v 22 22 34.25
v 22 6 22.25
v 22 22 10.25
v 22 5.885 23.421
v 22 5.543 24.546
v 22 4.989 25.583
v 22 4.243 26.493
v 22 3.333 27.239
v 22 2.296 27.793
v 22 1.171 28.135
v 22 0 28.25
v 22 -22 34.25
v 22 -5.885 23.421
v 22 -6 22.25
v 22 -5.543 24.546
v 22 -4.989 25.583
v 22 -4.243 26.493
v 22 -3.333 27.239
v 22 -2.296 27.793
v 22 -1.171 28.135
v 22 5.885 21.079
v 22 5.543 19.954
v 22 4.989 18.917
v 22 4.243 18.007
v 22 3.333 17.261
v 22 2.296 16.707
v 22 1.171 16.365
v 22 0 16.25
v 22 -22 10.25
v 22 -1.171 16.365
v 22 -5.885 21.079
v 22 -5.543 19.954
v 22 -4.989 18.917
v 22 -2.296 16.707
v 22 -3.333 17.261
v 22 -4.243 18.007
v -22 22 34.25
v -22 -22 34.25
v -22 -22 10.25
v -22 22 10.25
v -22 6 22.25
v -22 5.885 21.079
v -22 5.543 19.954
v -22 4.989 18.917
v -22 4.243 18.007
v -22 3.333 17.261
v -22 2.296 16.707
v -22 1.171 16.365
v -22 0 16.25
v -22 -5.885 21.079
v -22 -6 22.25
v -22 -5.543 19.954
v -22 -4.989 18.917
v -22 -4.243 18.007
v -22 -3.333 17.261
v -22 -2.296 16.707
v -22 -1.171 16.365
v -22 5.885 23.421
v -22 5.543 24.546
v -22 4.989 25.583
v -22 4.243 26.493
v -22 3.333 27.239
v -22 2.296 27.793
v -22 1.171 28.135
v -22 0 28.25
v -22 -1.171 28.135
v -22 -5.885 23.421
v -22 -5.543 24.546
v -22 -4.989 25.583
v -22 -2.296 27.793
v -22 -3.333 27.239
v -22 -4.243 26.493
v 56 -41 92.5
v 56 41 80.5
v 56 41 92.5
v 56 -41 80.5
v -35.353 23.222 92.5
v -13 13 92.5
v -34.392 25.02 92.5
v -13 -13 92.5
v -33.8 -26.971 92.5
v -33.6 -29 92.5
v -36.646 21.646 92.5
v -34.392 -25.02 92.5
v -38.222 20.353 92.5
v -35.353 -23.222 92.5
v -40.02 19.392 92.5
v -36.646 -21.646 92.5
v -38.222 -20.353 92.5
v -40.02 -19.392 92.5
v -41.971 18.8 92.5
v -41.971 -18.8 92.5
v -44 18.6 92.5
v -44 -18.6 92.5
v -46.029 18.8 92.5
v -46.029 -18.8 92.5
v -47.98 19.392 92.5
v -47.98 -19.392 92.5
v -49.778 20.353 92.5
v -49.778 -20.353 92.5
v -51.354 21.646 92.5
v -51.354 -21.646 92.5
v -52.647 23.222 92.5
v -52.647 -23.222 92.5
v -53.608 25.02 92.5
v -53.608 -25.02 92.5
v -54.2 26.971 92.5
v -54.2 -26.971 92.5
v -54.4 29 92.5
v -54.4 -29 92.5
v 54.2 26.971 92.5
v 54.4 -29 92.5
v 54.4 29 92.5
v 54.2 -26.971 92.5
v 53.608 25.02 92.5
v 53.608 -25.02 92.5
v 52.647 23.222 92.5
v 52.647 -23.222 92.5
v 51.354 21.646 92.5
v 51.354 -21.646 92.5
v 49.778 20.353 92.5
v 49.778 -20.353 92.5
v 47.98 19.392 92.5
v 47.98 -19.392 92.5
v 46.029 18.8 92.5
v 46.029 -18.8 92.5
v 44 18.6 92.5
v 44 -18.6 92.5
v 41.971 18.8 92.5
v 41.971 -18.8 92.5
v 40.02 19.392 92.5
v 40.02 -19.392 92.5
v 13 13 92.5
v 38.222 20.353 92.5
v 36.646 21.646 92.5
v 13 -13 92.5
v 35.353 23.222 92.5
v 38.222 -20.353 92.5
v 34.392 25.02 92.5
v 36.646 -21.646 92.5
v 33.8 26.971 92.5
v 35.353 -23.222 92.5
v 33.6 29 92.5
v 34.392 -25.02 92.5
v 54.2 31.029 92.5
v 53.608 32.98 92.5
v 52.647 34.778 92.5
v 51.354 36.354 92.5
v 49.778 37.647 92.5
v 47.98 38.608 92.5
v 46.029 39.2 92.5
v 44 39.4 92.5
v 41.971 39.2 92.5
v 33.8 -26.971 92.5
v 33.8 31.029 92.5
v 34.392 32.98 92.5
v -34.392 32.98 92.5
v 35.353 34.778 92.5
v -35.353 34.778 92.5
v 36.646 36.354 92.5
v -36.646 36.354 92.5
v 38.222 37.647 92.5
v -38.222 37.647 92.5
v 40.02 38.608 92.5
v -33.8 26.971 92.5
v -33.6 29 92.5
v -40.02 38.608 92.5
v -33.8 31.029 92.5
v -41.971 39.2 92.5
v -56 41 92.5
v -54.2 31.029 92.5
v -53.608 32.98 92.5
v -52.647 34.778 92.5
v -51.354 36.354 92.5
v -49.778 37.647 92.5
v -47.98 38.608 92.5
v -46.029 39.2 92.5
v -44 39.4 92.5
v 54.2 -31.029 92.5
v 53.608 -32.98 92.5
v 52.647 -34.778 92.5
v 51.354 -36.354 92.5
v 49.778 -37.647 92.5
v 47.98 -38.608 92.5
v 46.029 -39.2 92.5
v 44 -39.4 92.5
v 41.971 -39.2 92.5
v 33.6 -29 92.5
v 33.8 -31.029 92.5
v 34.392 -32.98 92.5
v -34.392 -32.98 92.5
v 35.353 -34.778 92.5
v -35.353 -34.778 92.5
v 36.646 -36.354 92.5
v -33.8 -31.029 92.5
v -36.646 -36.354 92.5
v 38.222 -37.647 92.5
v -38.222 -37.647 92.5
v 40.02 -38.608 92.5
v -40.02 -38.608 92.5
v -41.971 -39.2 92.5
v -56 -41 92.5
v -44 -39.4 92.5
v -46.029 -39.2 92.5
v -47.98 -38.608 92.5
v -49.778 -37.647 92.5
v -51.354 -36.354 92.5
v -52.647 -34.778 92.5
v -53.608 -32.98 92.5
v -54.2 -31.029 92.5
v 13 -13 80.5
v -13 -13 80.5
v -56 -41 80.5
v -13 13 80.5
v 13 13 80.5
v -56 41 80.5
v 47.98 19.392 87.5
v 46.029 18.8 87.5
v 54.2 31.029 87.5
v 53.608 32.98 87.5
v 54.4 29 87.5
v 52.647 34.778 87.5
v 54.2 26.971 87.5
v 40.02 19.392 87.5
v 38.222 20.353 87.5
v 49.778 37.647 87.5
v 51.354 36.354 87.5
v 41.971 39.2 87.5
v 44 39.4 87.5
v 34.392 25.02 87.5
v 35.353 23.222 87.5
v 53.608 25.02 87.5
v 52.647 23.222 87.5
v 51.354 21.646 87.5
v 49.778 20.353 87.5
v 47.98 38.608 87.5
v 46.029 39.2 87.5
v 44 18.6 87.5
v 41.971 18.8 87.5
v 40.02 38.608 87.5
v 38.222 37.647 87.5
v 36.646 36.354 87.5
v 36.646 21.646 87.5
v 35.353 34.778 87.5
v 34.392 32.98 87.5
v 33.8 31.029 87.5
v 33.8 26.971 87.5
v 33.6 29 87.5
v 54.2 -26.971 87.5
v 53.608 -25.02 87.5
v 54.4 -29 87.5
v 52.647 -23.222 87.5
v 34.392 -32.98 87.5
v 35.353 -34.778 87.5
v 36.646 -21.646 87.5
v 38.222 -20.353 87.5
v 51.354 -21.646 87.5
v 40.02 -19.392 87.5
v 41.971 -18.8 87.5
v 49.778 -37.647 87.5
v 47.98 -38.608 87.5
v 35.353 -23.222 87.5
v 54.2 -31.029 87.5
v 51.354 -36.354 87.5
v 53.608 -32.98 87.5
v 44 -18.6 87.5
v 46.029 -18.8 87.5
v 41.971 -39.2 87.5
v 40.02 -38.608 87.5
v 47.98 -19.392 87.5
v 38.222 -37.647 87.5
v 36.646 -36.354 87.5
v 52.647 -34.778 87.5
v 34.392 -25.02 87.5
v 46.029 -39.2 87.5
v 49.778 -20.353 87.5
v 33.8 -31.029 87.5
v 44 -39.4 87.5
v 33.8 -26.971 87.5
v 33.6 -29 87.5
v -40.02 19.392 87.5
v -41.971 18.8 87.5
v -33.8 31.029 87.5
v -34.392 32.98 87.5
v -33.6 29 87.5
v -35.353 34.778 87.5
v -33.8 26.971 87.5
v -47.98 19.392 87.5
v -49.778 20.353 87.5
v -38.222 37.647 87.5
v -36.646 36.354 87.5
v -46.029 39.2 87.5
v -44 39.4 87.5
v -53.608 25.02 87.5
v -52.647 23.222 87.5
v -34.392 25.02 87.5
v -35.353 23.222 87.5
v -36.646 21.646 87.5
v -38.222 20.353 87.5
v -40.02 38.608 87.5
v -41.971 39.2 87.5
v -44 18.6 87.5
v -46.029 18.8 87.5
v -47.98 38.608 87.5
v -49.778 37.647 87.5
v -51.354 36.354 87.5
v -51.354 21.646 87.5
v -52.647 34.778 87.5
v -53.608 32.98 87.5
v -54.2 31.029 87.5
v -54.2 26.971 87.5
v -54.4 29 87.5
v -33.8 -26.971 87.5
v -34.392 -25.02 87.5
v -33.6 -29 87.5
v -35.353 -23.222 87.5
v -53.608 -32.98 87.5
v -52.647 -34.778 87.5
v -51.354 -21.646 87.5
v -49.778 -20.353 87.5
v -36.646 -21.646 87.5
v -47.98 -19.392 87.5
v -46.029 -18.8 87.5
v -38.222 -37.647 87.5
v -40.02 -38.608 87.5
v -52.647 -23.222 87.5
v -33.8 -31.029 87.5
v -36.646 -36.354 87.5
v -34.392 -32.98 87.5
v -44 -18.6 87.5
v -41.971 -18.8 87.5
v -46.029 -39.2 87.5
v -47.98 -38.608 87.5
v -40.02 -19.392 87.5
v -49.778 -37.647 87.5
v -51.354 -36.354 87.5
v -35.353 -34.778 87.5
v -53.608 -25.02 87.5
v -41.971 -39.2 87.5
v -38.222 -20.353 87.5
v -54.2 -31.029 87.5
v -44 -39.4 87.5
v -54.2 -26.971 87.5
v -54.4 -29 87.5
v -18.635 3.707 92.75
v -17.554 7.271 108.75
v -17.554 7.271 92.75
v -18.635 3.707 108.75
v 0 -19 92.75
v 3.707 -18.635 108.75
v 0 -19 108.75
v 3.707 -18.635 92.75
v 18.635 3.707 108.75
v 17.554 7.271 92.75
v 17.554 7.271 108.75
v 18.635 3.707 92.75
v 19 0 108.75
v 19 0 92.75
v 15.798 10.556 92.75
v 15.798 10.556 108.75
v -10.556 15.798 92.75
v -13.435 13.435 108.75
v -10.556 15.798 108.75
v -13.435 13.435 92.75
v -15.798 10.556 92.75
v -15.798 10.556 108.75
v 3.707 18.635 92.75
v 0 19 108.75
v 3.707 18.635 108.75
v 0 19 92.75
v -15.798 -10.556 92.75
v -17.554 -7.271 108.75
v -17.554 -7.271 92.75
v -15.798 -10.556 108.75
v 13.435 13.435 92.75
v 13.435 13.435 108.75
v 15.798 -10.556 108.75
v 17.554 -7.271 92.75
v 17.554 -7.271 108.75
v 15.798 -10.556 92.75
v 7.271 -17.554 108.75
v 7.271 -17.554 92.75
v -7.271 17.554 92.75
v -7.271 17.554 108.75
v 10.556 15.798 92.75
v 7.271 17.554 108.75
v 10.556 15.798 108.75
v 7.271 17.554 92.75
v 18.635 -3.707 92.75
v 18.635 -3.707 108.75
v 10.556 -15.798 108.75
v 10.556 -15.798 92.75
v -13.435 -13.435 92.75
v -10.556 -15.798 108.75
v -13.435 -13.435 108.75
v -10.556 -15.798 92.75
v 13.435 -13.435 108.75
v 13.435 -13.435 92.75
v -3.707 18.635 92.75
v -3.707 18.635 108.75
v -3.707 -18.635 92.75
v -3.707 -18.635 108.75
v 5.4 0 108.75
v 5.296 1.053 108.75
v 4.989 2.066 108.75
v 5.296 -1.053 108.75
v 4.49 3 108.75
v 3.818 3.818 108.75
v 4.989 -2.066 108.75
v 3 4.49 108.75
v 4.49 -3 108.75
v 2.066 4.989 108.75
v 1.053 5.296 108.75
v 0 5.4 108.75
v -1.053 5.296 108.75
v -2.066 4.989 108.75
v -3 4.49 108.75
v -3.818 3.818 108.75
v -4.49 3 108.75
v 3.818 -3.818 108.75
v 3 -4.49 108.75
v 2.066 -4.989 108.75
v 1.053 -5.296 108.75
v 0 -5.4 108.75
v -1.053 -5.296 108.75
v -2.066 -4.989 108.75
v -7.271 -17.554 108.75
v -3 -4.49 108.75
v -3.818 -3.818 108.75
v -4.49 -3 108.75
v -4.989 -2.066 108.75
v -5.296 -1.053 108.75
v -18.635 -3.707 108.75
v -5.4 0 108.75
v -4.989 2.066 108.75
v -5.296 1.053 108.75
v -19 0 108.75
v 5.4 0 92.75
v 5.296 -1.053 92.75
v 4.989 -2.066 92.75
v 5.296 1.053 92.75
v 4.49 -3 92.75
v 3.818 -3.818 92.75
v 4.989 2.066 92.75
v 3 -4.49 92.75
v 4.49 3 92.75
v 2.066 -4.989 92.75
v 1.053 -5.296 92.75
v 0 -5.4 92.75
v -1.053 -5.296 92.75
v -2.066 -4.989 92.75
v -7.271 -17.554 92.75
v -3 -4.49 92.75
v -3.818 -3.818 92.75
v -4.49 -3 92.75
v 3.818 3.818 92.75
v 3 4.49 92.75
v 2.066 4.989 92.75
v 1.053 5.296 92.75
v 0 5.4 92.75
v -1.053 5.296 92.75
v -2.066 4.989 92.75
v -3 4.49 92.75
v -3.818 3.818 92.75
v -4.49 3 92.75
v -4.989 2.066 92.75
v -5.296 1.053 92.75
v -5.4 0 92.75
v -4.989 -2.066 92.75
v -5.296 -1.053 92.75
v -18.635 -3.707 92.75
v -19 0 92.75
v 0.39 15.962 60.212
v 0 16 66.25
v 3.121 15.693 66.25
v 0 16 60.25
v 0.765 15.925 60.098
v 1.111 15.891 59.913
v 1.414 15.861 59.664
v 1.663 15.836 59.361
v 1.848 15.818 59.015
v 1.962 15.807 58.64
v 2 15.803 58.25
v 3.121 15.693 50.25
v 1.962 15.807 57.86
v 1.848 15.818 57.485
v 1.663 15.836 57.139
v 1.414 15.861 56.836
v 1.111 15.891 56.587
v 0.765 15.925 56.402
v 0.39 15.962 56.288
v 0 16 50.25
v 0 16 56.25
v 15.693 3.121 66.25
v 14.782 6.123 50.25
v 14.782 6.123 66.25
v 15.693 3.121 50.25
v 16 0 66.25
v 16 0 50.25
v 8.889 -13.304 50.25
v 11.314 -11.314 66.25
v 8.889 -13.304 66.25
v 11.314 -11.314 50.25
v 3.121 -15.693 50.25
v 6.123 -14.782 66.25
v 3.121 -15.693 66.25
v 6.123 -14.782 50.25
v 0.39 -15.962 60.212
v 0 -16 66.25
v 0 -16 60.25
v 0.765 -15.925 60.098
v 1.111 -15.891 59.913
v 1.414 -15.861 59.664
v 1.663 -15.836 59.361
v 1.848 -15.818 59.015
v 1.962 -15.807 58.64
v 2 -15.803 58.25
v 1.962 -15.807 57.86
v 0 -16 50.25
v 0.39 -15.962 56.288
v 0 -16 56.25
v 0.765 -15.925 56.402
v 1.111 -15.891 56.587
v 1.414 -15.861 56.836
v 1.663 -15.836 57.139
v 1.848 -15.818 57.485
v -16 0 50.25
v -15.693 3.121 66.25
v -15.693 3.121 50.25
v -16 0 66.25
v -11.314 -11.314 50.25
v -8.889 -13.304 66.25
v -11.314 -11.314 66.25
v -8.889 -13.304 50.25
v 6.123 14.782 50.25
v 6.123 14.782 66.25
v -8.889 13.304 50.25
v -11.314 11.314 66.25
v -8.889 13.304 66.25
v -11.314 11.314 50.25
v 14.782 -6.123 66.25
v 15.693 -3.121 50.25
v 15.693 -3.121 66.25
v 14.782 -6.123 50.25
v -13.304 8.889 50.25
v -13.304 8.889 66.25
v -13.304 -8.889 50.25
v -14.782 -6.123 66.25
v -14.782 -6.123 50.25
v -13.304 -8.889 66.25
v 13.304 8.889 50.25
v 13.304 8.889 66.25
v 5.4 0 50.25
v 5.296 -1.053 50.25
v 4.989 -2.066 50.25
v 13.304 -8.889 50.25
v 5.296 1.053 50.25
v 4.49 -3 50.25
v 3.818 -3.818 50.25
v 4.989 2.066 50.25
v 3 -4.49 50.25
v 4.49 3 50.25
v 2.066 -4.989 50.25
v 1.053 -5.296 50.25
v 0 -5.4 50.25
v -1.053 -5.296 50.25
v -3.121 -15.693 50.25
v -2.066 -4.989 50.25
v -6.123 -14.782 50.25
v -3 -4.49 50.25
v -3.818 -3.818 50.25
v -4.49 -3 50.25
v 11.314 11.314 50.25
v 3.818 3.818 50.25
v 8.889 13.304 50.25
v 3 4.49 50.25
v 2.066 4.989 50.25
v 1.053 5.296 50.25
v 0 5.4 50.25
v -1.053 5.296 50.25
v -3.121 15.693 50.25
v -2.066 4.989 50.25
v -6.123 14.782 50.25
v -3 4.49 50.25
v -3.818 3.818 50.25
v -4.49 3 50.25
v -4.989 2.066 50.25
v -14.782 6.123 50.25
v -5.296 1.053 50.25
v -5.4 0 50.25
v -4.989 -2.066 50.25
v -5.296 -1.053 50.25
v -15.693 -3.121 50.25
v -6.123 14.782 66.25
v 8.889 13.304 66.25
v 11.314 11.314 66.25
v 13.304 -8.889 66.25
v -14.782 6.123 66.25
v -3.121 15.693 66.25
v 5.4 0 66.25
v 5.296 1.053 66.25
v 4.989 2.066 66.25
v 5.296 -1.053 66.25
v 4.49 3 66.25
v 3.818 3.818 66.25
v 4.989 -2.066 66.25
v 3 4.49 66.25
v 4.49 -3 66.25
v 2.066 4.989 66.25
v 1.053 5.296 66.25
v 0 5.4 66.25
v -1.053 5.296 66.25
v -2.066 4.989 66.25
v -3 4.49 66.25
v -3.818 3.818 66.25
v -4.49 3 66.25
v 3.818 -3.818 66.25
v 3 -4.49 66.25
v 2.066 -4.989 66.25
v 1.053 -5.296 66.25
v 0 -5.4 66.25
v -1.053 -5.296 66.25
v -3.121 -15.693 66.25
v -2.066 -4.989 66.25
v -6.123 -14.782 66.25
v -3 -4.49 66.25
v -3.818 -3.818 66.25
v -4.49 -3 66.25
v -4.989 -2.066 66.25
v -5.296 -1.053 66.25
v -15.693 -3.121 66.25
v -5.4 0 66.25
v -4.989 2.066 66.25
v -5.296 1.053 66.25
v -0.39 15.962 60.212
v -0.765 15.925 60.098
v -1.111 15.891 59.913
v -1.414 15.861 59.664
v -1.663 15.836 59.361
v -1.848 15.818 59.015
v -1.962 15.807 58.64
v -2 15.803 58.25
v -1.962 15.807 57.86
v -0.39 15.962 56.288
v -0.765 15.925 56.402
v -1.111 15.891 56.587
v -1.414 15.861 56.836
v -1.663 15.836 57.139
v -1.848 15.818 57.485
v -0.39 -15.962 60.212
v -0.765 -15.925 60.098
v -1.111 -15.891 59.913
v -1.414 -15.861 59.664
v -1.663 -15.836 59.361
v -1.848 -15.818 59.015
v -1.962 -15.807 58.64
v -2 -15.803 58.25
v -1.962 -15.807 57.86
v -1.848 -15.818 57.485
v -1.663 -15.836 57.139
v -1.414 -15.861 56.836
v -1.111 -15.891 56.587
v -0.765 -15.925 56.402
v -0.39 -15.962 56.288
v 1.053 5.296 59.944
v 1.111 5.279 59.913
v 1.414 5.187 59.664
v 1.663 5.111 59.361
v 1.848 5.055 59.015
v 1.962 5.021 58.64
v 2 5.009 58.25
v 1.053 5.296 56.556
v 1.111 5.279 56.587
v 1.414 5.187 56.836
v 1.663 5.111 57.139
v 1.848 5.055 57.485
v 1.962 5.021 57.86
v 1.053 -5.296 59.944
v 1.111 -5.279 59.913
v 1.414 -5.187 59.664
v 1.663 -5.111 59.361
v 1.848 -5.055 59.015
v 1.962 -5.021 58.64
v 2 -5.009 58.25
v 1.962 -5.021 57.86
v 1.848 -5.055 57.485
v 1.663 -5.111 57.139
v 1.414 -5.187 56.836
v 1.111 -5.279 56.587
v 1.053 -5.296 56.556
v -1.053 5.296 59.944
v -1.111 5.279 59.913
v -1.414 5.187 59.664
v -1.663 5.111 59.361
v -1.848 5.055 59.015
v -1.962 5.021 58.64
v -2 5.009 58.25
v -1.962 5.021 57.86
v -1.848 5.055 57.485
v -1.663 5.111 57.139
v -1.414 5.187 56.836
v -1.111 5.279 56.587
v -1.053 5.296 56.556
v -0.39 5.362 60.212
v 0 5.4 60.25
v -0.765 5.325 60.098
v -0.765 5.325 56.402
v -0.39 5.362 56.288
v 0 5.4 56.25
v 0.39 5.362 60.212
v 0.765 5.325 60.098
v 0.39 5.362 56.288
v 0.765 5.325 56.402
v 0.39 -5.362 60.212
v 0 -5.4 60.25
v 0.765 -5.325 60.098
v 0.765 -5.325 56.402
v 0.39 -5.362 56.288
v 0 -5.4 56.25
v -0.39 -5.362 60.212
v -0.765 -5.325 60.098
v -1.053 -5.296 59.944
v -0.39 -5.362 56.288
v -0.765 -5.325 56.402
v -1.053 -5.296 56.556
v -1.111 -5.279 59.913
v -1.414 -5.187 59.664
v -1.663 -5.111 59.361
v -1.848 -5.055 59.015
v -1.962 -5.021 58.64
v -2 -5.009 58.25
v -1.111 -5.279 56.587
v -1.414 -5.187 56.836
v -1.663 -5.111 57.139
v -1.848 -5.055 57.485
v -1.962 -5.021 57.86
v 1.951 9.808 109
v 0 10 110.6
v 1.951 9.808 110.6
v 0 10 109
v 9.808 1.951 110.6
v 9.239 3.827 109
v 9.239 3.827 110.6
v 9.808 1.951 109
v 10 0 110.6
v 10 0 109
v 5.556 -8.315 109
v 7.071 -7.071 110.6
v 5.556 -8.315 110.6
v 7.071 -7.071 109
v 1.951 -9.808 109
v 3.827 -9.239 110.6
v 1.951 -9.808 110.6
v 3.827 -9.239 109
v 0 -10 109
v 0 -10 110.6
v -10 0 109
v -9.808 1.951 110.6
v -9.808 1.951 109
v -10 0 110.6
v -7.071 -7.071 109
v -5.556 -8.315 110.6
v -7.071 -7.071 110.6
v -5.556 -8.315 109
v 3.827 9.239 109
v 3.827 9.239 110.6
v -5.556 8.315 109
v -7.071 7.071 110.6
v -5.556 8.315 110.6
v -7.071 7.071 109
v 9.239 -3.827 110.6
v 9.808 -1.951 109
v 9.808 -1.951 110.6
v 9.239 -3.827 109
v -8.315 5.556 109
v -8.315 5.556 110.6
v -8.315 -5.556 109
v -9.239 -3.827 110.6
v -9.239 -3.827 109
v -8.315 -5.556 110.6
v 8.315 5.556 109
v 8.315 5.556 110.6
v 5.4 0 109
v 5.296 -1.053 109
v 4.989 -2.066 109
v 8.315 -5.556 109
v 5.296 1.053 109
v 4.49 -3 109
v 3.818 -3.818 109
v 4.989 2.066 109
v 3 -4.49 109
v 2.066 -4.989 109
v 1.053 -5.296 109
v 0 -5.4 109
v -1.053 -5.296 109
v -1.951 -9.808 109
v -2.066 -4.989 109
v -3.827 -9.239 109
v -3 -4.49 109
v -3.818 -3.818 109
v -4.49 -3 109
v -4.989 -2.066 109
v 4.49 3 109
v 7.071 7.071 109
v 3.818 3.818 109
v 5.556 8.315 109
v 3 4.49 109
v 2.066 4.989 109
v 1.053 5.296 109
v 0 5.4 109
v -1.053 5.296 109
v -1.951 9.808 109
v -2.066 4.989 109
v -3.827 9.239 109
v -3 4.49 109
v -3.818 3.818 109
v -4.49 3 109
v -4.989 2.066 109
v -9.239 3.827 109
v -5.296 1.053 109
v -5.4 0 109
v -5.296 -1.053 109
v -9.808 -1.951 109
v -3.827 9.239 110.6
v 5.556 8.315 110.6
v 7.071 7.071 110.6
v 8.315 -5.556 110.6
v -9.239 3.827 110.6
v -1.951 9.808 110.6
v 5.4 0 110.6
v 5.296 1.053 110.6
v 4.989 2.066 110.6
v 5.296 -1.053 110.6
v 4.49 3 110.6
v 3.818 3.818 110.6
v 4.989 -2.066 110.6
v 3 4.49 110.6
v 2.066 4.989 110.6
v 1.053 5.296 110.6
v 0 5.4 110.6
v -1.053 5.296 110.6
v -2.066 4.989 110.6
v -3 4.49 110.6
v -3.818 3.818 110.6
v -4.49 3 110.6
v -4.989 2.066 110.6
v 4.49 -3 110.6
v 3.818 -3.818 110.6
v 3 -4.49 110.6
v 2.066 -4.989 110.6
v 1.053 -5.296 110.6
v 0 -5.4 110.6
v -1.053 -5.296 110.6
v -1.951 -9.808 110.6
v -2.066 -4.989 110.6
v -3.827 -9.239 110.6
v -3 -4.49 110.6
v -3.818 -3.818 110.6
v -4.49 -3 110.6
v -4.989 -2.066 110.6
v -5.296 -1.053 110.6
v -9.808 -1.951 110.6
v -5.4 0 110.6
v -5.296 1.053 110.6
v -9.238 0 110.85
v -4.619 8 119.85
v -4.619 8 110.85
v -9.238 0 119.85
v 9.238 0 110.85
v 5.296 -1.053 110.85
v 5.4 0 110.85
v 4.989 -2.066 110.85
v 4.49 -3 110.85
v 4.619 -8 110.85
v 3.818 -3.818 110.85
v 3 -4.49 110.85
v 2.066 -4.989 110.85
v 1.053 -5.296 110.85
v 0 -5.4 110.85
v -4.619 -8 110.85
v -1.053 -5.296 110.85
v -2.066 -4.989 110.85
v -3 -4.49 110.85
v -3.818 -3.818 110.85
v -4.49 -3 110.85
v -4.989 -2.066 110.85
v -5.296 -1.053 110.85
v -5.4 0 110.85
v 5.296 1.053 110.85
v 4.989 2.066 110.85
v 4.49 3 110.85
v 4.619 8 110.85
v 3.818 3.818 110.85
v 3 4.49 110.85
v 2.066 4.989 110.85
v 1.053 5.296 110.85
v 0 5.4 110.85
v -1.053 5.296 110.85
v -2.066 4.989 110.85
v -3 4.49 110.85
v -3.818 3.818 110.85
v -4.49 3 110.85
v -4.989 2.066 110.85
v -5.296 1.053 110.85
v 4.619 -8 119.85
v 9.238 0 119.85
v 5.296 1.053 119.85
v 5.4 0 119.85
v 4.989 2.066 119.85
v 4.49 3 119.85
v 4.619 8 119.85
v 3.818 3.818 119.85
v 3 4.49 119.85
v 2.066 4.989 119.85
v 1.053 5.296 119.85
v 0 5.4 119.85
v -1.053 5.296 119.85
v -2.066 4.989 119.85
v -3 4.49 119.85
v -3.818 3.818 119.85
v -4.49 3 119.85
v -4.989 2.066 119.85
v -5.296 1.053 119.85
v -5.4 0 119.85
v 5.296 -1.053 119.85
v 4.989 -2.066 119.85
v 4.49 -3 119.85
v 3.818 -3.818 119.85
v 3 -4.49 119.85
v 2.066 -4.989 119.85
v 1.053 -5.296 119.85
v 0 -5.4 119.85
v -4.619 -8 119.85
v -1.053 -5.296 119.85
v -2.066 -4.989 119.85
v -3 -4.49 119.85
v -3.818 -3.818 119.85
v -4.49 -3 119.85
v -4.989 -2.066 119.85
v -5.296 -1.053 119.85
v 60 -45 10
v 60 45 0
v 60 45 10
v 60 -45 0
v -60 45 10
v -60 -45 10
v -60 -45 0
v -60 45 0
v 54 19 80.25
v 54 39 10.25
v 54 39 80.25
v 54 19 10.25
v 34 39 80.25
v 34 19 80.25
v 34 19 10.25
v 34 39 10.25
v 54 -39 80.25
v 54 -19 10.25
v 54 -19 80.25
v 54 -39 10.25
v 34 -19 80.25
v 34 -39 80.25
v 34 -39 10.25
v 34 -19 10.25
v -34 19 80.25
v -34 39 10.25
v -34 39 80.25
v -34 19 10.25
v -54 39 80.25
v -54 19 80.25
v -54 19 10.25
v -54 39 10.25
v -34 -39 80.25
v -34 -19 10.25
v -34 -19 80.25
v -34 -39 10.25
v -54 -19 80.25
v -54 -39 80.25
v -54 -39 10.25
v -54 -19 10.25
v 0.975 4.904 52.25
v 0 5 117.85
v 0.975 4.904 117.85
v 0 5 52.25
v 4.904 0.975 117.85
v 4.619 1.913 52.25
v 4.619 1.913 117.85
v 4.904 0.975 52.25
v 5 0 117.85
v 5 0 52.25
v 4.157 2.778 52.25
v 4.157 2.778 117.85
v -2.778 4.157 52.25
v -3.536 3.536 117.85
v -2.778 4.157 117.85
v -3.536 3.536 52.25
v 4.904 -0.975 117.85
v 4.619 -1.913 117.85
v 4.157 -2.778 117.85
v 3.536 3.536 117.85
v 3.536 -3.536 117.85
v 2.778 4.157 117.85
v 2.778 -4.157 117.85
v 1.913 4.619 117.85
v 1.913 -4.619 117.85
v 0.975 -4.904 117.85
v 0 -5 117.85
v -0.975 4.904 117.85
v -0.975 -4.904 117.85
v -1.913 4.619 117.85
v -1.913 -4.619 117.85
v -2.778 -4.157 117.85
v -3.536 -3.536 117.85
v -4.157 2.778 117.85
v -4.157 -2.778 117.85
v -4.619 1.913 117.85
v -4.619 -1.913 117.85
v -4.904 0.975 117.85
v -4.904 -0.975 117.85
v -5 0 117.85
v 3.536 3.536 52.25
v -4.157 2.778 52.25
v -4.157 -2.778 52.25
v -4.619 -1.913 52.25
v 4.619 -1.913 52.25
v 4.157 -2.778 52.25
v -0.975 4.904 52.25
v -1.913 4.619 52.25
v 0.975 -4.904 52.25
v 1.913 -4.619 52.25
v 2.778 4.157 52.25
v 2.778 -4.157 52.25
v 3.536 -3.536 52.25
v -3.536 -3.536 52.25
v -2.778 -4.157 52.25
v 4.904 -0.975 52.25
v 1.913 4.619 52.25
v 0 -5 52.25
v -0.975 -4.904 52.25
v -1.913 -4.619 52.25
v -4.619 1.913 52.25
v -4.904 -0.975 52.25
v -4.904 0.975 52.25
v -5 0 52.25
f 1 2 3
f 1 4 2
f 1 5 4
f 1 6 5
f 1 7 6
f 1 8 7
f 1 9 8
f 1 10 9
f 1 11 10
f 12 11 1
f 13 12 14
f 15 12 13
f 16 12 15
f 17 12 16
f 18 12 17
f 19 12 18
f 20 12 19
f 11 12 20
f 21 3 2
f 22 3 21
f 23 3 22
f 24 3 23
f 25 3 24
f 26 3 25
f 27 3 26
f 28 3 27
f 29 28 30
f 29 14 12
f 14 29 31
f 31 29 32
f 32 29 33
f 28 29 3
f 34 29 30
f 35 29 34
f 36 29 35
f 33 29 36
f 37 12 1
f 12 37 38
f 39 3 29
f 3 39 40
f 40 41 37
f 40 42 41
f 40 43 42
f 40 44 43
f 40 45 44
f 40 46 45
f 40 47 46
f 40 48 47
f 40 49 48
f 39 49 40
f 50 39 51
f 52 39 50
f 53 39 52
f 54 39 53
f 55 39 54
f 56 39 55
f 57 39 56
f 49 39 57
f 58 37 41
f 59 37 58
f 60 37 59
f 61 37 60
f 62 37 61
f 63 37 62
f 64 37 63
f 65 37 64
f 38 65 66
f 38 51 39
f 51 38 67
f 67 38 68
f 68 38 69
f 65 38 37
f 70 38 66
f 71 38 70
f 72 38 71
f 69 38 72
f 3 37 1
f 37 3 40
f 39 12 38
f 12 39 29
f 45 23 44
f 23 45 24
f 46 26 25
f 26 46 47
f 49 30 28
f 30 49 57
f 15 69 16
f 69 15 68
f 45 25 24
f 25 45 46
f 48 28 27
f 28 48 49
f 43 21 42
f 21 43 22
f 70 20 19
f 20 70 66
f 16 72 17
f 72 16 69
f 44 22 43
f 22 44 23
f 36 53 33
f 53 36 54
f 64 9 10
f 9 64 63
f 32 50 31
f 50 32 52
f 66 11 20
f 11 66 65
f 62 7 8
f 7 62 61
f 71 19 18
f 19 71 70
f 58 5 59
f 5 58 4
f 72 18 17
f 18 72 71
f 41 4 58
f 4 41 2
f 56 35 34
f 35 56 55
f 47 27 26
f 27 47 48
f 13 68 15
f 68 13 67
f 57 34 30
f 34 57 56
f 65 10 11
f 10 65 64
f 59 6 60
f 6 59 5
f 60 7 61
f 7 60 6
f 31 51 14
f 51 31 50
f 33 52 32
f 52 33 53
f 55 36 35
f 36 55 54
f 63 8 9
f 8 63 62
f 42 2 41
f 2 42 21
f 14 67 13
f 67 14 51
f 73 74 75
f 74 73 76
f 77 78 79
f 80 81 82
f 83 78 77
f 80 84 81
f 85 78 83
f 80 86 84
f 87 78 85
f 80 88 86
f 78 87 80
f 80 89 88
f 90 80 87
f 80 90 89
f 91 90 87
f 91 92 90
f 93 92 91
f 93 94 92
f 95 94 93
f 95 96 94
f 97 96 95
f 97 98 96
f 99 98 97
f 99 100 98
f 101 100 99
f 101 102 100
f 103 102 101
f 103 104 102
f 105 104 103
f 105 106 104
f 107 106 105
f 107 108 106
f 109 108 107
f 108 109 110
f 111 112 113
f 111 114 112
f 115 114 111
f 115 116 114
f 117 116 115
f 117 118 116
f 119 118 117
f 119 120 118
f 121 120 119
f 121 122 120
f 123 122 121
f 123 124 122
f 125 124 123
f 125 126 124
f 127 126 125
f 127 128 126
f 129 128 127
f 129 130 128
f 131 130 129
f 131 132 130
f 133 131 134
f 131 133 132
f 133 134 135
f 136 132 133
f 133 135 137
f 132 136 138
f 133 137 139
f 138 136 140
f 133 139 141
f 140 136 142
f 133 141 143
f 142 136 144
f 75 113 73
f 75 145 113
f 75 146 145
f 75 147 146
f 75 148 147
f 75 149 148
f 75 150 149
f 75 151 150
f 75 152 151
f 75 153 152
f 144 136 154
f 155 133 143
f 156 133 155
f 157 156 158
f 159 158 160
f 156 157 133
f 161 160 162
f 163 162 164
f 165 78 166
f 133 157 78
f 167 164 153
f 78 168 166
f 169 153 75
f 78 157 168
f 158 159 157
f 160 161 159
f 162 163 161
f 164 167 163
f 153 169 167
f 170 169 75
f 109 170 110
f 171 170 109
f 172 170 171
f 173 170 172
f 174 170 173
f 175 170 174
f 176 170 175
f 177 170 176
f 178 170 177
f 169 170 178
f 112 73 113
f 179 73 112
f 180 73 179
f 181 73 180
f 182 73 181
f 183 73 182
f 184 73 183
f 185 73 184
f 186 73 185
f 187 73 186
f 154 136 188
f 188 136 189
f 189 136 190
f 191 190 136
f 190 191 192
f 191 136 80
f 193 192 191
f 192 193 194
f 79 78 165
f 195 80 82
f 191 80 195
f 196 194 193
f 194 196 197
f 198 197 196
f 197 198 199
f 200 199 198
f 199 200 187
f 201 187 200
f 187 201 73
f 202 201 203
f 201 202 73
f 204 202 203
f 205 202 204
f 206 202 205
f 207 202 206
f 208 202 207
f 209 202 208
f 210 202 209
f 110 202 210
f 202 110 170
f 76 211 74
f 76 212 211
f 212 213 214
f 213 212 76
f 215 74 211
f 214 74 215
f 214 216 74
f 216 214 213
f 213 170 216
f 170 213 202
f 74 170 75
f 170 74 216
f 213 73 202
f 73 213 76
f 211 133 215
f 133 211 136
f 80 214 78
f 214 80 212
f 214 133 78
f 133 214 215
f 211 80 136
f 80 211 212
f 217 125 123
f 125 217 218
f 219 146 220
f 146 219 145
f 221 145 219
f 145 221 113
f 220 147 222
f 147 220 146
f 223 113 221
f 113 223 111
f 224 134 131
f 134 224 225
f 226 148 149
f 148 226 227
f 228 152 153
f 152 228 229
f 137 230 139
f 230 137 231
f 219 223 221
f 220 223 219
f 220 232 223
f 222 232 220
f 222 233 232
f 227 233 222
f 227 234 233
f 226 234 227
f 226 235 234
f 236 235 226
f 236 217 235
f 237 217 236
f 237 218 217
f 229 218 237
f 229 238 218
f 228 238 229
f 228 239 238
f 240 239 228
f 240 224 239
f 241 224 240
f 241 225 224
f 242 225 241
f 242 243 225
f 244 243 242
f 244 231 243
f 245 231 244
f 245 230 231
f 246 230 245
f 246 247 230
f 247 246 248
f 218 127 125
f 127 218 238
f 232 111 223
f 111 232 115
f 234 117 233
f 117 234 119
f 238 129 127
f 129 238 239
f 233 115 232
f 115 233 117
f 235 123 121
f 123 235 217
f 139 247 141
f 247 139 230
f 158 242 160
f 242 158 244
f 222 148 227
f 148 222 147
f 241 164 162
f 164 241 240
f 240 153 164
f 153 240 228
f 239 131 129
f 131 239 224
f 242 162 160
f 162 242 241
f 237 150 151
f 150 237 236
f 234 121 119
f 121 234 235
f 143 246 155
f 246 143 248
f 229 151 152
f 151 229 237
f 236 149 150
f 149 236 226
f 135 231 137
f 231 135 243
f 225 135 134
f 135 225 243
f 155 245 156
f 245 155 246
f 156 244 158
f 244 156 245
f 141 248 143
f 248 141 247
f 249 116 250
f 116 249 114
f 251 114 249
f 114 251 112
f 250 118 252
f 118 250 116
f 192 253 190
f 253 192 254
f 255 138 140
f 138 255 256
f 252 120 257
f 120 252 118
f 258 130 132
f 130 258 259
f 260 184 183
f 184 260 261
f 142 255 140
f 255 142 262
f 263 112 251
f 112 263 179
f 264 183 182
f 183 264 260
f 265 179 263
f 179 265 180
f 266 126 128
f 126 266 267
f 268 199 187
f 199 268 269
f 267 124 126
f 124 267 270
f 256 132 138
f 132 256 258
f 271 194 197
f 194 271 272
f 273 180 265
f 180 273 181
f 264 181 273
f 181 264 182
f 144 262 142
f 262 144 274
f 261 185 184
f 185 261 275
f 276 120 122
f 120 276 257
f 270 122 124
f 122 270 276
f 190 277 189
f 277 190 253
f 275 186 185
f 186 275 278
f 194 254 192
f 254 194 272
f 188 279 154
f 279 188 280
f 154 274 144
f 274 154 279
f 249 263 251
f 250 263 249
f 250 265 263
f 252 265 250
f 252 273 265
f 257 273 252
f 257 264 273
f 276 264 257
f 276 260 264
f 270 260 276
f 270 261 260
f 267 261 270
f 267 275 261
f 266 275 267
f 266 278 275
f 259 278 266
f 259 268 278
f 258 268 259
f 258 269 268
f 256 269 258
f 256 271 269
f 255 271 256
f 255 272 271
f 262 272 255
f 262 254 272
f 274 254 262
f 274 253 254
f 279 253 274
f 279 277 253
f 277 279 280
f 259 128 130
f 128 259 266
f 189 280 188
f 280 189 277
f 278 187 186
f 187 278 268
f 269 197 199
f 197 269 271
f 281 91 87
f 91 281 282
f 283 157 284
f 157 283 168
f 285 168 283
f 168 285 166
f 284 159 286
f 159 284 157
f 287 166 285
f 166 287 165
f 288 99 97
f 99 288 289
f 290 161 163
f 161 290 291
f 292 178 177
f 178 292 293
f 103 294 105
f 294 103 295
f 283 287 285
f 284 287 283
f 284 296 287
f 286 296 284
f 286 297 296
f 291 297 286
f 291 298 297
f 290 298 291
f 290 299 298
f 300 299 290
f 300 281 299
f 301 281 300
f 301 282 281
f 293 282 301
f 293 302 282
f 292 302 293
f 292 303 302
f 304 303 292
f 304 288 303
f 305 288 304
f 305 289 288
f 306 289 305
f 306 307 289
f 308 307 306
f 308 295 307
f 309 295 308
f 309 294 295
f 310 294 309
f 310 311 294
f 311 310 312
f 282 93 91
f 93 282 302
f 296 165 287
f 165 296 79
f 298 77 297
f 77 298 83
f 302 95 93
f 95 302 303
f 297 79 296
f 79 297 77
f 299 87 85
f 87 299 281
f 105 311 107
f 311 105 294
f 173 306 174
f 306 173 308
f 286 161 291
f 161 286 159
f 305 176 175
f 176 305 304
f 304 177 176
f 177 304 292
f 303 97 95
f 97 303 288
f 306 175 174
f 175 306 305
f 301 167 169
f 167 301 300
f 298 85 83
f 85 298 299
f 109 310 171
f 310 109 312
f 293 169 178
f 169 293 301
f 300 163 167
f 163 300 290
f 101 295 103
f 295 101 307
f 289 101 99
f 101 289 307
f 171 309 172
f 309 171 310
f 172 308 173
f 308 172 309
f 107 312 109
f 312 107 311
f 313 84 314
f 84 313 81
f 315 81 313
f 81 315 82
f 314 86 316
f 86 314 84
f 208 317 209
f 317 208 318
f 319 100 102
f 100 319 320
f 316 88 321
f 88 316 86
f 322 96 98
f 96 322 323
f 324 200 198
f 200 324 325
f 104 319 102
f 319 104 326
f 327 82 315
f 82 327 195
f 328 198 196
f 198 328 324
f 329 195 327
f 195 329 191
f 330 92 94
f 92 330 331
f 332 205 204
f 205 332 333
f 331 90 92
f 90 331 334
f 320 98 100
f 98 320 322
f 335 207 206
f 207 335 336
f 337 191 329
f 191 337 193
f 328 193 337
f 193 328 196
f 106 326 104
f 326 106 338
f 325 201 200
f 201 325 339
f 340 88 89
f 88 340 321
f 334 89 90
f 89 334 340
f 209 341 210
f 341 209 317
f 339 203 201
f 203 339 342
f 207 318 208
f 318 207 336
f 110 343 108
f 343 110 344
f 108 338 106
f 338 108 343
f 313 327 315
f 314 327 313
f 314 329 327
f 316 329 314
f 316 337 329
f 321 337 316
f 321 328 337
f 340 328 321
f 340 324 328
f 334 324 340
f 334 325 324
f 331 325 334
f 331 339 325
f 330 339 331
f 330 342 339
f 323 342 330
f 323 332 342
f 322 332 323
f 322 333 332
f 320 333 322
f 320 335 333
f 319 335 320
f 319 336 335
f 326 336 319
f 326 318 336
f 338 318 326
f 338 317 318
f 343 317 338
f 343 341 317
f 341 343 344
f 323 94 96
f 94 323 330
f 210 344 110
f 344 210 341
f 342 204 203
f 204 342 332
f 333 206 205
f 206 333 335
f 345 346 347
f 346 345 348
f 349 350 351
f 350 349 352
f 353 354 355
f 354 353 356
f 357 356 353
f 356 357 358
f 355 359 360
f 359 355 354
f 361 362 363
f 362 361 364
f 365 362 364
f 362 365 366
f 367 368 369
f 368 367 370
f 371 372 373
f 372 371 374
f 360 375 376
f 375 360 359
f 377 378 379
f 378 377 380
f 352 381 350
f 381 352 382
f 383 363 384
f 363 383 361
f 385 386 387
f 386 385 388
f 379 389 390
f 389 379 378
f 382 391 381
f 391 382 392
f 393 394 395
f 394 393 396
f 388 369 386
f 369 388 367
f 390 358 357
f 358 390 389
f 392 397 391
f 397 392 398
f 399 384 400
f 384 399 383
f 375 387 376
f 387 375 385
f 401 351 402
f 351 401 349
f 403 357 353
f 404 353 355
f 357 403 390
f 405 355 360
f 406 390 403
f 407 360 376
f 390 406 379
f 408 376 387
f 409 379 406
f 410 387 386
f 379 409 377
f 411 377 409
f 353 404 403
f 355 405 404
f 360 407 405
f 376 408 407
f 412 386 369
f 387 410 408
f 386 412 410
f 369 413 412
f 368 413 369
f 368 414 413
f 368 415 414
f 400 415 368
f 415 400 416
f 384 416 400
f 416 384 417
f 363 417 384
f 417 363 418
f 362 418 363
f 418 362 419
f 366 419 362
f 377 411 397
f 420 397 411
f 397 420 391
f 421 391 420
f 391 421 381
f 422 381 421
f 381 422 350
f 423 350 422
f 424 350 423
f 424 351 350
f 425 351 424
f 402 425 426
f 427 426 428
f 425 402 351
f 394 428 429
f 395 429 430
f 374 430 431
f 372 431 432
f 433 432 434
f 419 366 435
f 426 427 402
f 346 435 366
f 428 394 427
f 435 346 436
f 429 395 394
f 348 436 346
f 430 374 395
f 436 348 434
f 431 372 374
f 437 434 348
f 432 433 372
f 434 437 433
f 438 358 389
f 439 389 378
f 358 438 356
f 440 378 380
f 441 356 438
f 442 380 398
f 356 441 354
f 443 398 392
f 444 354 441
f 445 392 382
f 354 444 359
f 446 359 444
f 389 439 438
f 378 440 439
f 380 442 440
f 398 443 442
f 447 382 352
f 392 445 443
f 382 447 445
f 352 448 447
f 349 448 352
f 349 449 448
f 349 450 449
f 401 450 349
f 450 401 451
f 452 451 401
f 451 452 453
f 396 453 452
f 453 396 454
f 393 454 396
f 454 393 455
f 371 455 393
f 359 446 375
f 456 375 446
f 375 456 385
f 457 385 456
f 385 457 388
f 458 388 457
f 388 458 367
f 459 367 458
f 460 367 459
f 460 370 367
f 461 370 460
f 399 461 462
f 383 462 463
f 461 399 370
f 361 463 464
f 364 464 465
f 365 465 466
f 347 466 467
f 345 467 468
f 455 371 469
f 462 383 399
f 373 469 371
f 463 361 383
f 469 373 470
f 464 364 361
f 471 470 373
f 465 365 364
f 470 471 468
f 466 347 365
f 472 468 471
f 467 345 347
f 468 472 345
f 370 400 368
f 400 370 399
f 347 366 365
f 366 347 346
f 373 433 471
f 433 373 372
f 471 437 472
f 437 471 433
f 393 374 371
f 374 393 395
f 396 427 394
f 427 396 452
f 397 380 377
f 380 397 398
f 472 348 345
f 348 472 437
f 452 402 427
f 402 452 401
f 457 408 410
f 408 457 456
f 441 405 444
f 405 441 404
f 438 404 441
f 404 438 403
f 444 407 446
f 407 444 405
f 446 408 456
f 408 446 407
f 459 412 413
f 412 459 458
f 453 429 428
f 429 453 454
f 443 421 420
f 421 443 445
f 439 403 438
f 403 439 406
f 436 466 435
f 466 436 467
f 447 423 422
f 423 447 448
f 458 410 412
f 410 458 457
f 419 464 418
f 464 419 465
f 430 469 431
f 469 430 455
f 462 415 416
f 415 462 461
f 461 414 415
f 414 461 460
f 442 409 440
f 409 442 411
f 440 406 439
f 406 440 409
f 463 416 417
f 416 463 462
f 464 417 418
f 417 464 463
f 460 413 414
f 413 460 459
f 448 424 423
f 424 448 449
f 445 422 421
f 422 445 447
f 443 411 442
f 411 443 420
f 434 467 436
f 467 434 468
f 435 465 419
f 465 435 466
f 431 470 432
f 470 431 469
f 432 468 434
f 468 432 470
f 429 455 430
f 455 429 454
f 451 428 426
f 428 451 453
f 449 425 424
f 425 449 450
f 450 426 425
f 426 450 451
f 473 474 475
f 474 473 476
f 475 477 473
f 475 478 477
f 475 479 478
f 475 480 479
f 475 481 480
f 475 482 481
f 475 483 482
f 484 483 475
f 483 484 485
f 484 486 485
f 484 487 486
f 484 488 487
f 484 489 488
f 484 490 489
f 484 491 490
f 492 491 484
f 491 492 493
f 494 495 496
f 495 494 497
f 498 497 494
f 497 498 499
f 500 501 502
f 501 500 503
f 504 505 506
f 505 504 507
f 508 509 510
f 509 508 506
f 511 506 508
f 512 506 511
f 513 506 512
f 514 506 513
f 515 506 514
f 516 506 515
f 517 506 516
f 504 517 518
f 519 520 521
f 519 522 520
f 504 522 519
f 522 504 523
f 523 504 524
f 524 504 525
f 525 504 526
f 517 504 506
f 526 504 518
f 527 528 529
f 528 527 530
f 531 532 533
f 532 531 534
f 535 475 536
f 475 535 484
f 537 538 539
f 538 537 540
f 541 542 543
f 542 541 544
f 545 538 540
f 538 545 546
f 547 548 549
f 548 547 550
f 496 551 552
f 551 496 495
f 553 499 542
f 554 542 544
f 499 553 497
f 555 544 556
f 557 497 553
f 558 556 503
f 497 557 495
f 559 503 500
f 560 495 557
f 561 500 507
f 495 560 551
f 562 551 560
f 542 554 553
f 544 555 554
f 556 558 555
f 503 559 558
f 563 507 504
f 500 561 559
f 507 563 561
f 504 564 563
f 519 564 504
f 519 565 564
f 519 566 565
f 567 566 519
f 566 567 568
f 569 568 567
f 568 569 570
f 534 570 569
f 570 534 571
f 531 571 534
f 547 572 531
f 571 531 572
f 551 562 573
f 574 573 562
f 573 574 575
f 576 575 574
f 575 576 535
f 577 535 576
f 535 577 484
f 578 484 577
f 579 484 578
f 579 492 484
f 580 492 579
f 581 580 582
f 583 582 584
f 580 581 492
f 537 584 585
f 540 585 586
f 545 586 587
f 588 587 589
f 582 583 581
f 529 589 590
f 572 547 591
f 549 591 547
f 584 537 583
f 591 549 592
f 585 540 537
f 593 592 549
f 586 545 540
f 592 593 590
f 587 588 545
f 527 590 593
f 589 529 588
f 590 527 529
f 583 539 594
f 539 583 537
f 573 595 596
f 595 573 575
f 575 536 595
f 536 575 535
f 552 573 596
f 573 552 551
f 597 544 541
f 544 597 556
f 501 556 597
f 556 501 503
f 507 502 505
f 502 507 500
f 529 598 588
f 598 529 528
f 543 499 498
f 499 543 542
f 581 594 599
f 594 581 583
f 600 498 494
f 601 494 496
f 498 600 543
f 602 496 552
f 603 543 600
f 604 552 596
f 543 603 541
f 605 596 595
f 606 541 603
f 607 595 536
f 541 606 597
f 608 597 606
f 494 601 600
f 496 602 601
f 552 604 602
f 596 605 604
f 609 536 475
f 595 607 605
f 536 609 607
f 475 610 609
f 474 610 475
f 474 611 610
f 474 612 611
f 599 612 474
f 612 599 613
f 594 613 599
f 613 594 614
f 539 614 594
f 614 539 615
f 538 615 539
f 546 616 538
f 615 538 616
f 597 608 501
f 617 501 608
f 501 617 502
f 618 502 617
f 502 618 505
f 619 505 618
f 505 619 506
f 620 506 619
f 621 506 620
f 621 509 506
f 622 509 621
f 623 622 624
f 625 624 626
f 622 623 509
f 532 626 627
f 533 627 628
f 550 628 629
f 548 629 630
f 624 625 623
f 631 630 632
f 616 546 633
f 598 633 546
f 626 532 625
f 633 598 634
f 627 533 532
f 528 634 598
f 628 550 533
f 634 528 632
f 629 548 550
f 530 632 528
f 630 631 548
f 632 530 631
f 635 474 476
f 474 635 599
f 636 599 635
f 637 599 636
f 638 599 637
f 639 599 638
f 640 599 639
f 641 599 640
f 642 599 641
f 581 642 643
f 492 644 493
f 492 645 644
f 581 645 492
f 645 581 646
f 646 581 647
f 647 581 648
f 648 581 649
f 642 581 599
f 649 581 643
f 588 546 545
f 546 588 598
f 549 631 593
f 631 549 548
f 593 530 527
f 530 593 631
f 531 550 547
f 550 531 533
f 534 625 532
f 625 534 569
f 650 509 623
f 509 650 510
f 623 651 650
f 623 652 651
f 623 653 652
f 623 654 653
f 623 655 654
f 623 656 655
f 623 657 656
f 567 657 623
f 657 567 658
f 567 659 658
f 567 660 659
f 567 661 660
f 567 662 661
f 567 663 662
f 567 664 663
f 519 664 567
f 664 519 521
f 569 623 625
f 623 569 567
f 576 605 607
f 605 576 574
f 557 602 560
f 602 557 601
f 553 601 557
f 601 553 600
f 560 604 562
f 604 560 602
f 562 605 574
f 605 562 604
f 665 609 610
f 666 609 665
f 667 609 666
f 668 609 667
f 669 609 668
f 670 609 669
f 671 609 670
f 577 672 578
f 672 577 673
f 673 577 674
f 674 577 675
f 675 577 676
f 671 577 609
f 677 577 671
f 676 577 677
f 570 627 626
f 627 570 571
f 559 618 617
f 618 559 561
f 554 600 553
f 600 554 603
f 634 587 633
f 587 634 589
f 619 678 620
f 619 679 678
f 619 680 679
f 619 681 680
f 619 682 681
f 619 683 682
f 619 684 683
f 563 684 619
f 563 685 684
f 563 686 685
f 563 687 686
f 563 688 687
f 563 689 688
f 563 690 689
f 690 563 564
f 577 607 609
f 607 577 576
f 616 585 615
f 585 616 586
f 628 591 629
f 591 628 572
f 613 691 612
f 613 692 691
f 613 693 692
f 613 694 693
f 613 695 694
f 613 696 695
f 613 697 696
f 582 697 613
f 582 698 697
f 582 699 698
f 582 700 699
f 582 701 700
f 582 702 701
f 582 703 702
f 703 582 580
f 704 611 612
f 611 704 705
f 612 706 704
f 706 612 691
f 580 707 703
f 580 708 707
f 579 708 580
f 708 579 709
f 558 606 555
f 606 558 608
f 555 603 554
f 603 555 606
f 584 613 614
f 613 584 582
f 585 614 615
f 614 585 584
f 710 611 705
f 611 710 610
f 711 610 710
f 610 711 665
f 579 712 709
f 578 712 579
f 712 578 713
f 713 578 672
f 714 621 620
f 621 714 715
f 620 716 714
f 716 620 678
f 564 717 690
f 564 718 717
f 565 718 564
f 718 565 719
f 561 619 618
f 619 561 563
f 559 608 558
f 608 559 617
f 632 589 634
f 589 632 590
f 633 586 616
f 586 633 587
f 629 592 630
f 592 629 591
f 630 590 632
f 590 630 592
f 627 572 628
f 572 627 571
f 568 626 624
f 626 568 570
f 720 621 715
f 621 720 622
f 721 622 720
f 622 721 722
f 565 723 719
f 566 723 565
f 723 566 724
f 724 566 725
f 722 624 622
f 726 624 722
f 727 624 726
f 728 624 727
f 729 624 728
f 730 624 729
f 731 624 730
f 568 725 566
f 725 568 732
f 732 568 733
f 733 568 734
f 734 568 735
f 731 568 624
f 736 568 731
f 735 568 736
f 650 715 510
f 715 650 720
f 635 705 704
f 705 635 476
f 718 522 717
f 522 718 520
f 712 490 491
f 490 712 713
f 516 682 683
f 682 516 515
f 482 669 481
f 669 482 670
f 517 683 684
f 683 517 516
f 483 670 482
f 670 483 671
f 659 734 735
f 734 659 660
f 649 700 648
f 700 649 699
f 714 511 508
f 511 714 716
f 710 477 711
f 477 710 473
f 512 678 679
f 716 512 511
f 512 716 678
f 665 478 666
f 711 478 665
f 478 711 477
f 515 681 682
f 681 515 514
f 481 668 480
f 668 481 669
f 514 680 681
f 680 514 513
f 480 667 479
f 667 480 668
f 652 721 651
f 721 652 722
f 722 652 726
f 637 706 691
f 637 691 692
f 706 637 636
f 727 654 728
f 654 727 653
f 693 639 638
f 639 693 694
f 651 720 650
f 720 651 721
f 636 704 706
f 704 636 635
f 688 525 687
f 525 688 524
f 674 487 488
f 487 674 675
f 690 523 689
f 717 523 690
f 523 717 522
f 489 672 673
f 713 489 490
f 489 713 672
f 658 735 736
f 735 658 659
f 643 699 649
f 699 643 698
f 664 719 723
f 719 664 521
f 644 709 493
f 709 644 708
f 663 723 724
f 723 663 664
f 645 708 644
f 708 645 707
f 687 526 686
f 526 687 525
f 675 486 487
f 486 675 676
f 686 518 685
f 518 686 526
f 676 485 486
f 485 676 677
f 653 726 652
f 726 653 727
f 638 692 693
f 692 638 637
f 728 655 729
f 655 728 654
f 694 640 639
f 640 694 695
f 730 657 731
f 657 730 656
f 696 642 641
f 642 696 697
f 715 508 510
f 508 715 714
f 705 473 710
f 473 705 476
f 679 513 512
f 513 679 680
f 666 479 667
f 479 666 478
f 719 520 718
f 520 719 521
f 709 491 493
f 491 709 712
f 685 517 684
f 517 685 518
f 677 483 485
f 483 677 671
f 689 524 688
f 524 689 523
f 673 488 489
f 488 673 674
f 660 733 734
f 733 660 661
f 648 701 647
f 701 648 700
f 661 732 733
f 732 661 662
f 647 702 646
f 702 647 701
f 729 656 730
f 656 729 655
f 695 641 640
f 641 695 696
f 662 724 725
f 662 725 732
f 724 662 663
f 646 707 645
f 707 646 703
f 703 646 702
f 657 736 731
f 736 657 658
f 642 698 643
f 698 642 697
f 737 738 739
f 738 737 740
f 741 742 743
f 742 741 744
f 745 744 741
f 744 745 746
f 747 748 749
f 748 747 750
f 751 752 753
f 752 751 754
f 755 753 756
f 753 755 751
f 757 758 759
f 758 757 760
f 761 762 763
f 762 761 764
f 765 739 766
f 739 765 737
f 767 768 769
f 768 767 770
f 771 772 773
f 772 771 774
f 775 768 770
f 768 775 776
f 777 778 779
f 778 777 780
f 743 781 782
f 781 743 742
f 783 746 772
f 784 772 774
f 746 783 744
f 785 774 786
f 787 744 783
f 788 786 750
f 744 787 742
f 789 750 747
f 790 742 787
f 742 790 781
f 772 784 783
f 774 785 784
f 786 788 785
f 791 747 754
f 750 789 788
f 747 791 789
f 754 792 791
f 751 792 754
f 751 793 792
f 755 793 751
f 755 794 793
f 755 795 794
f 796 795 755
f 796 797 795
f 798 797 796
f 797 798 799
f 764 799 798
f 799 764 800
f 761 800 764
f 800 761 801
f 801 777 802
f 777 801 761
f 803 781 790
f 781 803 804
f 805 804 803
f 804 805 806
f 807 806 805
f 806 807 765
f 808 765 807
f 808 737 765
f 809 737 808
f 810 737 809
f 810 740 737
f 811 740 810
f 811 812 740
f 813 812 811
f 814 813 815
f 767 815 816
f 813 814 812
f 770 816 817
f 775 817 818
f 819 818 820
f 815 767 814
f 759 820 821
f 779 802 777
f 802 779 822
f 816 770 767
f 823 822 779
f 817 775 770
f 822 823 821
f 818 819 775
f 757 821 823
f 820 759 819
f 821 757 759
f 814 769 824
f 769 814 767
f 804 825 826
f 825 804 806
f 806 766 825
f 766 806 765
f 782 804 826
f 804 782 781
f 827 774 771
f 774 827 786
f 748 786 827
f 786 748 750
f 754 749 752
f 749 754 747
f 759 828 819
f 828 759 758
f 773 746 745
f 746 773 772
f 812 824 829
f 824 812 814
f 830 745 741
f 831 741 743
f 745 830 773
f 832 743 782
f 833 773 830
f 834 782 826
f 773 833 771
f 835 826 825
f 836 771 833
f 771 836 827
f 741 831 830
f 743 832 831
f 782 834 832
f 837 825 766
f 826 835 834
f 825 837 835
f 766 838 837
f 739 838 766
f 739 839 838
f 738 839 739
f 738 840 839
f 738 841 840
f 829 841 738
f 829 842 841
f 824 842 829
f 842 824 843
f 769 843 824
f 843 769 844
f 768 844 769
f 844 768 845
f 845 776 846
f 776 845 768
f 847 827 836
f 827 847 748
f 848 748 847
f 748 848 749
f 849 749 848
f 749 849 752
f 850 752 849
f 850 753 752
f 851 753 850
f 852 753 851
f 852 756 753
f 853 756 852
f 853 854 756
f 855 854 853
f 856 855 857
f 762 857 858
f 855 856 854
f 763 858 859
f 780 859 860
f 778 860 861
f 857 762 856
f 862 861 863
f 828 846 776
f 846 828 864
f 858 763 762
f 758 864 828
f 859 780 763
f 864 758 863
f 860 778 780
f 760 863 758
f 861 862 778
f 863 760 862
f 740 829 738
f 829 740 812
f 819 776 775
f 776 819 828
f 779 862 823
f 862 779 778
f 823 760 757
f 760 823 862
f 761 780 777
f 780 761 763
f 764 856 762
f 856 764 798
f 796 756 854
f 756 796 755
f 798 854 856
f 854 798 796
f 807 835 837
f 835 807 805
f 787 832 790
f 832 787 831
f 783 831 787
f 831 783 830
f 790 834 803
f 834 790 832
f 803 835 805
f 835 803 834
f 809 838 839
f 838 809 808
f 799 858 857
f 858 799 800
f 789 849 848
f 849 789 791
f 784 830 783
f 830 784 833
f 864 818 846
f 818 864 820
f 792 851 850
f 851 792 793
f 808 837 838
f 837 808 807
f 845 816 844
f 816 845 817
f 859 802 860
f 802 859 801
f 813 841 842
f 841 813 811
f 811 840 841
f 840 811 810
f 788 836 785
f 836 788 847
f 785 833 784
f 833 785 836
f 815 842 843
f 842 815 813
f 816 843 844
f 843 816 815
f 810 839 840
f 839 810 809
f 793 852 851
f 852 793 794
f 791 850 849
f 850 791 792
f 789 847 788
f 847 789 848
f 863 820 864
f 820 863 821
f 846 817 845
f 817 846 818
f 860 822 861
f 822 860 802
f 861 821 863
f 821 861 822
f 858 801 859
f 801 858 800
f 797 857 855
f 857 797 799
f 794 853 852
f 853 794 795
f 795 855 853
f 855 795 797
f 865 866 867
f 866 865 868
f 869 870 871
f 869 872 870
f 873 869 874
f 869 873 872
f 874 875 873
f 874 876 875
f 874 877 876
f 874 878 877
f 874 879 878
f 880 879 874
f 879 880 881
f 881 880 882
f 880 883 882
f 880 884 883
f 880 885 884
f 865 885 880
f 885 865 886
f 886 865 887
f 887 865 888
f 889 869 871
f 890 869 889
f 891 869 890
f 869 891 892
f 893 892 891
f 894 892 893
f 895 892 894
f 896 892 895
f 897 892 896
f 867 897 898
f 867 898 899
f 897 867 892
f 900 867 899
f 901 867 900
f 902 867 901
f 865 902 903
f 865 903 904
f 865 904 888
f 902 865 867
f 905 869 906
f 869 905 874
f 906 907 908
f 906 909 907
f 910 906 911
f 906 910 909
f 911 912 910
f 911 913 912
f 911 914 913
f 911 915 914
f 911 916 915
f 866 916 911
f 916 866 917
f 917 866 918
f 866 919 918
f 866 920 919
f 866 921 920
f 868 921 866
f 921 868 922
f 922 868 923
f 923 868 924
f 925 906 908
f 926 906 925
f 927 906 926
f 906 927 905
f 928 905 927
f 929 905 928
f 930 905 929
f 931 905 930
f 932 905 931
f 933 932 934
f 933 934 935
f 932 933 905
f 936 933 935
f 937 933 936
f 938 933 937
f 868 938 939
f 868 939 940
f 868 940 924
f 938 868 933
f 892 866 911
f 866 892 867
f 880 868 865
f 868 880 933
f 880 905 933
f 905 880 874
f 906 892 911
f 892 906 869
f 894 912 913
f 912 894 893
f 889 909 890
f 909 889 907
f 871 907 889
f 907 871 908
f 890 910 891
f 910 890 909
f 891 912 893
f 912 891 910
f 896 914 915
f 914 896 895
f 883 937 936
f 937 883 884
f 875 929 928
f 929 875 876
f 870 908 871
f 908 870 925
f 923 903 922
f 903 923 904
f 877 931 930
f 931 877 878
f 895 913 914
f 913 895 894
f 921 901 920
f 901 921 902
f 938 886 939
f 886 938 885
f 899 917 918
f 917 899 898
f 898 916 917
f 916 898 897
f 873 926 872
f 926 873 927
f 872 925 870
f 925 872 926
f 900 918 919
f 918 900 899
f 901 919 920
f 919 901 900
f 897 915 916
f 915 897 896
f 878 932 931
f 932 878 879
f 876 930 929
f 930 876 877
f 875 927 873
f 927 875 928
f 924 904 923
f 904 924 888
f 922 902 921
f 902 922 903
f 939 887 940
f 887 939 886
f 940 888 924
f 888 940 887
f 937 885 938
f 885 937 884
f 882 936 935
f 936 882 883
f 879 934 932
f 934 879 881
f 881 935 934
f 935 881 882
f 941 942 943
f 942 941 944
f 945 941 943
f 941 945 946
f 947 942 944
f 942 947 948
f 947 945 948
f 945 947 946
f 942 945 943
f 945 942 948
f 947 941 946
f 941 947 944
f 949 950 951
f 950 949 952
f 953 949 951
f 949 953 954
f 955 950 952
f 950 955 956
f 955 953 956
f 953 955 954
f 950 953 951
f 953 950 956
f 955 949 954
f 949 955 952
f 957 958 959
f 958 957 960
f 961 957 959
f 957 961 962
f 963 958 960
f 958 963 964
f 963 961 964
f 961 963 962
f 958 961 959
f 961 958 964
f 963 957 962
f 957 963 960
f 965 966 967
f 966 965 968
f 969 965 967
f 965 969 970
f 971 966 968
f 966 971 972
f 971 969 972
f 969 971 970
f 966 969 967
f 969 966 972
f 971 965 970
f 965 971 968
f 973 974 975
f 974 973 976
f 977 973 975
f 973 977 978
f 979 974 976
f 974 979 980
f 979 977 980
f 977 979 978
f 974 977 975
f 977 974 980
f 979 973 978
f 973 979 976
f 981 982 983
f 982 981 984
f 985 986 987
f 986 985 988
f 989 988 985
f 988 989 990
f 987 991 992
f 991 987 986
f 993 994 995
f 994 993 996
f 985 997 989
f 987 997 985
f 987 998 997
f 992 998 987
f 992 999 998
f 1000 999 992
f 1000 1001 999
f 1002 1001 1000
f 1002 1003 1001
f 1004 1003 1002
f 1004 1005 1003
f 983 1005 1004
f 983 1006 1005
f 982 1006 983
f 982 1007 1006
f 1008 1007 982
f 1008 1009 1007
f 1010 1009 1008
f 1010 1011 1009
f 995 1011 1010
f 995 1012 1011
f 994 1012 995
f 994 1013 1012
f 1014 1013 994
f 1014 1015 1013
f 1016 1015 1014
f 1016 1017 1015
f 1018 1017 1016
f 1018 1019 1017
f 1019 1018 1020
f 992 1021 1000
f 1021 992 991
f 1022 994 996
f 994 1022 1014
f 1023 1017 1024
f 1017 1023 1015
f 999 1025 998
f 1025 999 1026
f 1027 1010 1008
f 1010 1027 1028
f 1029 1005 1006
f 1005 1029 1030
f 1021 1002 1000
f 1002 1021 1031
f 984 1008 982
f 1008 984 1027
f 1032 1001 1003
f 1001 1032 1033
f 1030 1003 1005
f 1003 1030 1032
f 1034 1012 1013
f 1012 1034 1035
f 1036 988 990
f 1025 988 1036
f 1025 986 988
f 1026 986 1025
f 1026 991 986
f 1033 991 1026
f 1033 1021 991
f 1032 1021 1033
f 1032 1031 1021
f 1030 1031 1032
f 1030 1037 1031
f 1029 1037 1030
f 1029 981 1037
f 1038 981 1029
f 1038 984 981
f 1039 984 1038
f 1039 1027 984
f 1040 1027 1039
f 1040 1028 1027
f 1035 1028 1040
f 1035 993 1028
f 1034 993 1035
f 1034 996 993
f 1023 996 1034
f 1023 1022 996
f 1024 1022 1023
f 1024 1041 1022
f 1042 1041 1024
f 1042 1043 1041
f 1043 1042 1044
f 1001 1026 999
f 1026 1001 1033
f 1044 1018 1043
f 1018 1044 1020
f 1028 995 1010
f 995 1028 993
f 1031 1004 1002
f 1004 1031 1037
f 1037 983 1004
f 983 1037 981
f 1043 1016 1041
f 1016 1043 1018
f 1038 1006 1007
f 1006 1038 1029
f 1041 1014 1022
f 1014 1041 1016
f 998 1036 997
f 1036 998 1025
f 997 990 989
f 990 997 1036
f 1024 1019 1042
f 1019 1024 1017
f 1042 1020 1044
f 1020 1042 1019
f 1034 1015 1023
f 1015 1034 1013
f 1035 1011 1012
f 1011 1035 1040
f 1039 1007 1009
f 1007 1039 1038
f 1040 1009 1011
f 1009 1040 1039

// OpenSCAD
$fn = 32;

// ------------------------------------------------------------------------
// Arbor press fixture: screw d10, posts 70 mm, gap 16 mm
// Every part is its own module, assembly() places every instance.
// ------------------------------------------------------------------------

// --- part 1 ---
module press_bed() {
  difference() {
    translate([-60, -45, 0]) cube([120, 90, 10]);
  }
}

// --- part 2 ---
module anvil_block() {
  difference() {
    translate([-22, -22, 0]) cube([44, 44, 24]);
    translate([0, 0, 12]) rotate([0, 90, 0]) cylinder(h = 46, d = 12, center = true);
  }
}

// --- part 3 ---
module press_post_a() {
  translate([-10, -10, 0]) cube([20, 20, 70]);
}

// --- part 4 ---
module press_post_b() {
  translate([-10, -10, 0]) cube([20, 20, 70]);
}

// --- part 5 ---
module press_post_c() {
  translate([-10, -10, 0]) cube([20, 20, 70]);
}

// --- part 6 ---
module press_post_d() {
  translate([-10, -10, 0]) cube([20, 20, 70]);
}

// --- part 7 ---
module press_frame() {
  difference() {
    translate([-56, -41, 0]) cube([112, 82, 12]);
    translate([-13, -13, -1]) cube([26, 26, 14]);
    translate([44, 29, 7]) cylinder(h = 6, d = 20.8);
    translate([44, -29, 7]) cylinder(h = 6, d = 20.8);
    translate([-44, 29, 7]) cylinder(h = 6, d = 20.8);
    translate([-44, -29, 7]) cylinder(h = 6, d = 20.8);
  }
}

// --- part 8 ---
module guide_ring() {
  difference() {
      translate([0, 0, 0]) cylinder(h = 16, d = 38);
      translate([0, 0, -1]) cylinder(h = 18, d = 10.8);
    }
}

// --- part 9 ---
module press_screw() {
  translate([0, 0, -32.8]) cylinder(h = 65.6, d = 10);
}

// --- part 10 ---
module press_head() {
  difference() {
    cylinder(h = 16, d = 32);
    translate([0, 0, -1]) cylinder(h = 18, d = 10.8);
    translate([0, 0, 8]) rotate([90, 0, 0]) cylinder(h = 34, d = 4, center = true);
  }
}

// --- part 11 ---
module nut_washer() {
  difference() {
      translate([0, 0, 0]) cylinder(h = 1.6, d = 20);
      translate([0, 0, -1]) cylinder(h = 3.6, d = 10.8);
    }
}

// --- part 12 ---
module press_nut() {
  difference() {
    linear_extrude(height = 9) polygon(points = [[9.238, 0], [4.619, 8], [-4.619, 8], [-9.238, 0], [-4.619, -8], [4.619, -8]]);
    translate([0, 0, -1]) cylinder(h = 11, d = 10.8);
  }
}

// --- assembly ---
module assembly() {
  color([0.80, 0.24, 0.20]) translate([0, 0, 0]) rotate([0, 0, 0]) press_bed();
  color([0.20, 0.45, 0.75]) translate([0, 0, 10.25]) rotate([0, 0, 0]) anvil_block();
  color([0.25, 0.62, 0.32]) translate([44, 29, 10.25]) rotate([0, 0, 0]) press_post_a();
  color([0.92, 0.70, 0.18]) translate([44, -29, 10.25]) rotate([0, 0, 0]) press_post_b();
  color([0.58, 0.35, 0.70]) translate([-44, 29, 10.25]) rotate([0, 0, 0]) press_post_c();
  color([0.16, 0.66, 0.66]) translate([-44, -29, 10.25]) rotate([0, 0, 0]) press_post_d();
  color([0.85, 0.48, 0.18]) translate([0, 0, 80.5]) rotate([0, 0, 0]) press_frame();
  color([0.55, 0.60, 0.65]) translate([0, 0, 92.75]) rotate([0, 0, 0]) guide_ring();
  color([0.75, 0.30, 0.55]) translate([0, 0, 85.05]) rotate([0, 0, 0]) press_screw();
  color([0.42, 0.52, 0.28]) translate([0, 0, 50.25]) rotate([0, 0, 0]) press_head();
  color([0.80, 0.24, 0.20]) translate([0, 0, 109]) rotate([0, 0, 0]) nut_washer();
  color([0.20, 0.45, 0.75]) translate([0, 0, 110.85]) rotate([0, 0, 0]) press_nut();
}

assembly();
